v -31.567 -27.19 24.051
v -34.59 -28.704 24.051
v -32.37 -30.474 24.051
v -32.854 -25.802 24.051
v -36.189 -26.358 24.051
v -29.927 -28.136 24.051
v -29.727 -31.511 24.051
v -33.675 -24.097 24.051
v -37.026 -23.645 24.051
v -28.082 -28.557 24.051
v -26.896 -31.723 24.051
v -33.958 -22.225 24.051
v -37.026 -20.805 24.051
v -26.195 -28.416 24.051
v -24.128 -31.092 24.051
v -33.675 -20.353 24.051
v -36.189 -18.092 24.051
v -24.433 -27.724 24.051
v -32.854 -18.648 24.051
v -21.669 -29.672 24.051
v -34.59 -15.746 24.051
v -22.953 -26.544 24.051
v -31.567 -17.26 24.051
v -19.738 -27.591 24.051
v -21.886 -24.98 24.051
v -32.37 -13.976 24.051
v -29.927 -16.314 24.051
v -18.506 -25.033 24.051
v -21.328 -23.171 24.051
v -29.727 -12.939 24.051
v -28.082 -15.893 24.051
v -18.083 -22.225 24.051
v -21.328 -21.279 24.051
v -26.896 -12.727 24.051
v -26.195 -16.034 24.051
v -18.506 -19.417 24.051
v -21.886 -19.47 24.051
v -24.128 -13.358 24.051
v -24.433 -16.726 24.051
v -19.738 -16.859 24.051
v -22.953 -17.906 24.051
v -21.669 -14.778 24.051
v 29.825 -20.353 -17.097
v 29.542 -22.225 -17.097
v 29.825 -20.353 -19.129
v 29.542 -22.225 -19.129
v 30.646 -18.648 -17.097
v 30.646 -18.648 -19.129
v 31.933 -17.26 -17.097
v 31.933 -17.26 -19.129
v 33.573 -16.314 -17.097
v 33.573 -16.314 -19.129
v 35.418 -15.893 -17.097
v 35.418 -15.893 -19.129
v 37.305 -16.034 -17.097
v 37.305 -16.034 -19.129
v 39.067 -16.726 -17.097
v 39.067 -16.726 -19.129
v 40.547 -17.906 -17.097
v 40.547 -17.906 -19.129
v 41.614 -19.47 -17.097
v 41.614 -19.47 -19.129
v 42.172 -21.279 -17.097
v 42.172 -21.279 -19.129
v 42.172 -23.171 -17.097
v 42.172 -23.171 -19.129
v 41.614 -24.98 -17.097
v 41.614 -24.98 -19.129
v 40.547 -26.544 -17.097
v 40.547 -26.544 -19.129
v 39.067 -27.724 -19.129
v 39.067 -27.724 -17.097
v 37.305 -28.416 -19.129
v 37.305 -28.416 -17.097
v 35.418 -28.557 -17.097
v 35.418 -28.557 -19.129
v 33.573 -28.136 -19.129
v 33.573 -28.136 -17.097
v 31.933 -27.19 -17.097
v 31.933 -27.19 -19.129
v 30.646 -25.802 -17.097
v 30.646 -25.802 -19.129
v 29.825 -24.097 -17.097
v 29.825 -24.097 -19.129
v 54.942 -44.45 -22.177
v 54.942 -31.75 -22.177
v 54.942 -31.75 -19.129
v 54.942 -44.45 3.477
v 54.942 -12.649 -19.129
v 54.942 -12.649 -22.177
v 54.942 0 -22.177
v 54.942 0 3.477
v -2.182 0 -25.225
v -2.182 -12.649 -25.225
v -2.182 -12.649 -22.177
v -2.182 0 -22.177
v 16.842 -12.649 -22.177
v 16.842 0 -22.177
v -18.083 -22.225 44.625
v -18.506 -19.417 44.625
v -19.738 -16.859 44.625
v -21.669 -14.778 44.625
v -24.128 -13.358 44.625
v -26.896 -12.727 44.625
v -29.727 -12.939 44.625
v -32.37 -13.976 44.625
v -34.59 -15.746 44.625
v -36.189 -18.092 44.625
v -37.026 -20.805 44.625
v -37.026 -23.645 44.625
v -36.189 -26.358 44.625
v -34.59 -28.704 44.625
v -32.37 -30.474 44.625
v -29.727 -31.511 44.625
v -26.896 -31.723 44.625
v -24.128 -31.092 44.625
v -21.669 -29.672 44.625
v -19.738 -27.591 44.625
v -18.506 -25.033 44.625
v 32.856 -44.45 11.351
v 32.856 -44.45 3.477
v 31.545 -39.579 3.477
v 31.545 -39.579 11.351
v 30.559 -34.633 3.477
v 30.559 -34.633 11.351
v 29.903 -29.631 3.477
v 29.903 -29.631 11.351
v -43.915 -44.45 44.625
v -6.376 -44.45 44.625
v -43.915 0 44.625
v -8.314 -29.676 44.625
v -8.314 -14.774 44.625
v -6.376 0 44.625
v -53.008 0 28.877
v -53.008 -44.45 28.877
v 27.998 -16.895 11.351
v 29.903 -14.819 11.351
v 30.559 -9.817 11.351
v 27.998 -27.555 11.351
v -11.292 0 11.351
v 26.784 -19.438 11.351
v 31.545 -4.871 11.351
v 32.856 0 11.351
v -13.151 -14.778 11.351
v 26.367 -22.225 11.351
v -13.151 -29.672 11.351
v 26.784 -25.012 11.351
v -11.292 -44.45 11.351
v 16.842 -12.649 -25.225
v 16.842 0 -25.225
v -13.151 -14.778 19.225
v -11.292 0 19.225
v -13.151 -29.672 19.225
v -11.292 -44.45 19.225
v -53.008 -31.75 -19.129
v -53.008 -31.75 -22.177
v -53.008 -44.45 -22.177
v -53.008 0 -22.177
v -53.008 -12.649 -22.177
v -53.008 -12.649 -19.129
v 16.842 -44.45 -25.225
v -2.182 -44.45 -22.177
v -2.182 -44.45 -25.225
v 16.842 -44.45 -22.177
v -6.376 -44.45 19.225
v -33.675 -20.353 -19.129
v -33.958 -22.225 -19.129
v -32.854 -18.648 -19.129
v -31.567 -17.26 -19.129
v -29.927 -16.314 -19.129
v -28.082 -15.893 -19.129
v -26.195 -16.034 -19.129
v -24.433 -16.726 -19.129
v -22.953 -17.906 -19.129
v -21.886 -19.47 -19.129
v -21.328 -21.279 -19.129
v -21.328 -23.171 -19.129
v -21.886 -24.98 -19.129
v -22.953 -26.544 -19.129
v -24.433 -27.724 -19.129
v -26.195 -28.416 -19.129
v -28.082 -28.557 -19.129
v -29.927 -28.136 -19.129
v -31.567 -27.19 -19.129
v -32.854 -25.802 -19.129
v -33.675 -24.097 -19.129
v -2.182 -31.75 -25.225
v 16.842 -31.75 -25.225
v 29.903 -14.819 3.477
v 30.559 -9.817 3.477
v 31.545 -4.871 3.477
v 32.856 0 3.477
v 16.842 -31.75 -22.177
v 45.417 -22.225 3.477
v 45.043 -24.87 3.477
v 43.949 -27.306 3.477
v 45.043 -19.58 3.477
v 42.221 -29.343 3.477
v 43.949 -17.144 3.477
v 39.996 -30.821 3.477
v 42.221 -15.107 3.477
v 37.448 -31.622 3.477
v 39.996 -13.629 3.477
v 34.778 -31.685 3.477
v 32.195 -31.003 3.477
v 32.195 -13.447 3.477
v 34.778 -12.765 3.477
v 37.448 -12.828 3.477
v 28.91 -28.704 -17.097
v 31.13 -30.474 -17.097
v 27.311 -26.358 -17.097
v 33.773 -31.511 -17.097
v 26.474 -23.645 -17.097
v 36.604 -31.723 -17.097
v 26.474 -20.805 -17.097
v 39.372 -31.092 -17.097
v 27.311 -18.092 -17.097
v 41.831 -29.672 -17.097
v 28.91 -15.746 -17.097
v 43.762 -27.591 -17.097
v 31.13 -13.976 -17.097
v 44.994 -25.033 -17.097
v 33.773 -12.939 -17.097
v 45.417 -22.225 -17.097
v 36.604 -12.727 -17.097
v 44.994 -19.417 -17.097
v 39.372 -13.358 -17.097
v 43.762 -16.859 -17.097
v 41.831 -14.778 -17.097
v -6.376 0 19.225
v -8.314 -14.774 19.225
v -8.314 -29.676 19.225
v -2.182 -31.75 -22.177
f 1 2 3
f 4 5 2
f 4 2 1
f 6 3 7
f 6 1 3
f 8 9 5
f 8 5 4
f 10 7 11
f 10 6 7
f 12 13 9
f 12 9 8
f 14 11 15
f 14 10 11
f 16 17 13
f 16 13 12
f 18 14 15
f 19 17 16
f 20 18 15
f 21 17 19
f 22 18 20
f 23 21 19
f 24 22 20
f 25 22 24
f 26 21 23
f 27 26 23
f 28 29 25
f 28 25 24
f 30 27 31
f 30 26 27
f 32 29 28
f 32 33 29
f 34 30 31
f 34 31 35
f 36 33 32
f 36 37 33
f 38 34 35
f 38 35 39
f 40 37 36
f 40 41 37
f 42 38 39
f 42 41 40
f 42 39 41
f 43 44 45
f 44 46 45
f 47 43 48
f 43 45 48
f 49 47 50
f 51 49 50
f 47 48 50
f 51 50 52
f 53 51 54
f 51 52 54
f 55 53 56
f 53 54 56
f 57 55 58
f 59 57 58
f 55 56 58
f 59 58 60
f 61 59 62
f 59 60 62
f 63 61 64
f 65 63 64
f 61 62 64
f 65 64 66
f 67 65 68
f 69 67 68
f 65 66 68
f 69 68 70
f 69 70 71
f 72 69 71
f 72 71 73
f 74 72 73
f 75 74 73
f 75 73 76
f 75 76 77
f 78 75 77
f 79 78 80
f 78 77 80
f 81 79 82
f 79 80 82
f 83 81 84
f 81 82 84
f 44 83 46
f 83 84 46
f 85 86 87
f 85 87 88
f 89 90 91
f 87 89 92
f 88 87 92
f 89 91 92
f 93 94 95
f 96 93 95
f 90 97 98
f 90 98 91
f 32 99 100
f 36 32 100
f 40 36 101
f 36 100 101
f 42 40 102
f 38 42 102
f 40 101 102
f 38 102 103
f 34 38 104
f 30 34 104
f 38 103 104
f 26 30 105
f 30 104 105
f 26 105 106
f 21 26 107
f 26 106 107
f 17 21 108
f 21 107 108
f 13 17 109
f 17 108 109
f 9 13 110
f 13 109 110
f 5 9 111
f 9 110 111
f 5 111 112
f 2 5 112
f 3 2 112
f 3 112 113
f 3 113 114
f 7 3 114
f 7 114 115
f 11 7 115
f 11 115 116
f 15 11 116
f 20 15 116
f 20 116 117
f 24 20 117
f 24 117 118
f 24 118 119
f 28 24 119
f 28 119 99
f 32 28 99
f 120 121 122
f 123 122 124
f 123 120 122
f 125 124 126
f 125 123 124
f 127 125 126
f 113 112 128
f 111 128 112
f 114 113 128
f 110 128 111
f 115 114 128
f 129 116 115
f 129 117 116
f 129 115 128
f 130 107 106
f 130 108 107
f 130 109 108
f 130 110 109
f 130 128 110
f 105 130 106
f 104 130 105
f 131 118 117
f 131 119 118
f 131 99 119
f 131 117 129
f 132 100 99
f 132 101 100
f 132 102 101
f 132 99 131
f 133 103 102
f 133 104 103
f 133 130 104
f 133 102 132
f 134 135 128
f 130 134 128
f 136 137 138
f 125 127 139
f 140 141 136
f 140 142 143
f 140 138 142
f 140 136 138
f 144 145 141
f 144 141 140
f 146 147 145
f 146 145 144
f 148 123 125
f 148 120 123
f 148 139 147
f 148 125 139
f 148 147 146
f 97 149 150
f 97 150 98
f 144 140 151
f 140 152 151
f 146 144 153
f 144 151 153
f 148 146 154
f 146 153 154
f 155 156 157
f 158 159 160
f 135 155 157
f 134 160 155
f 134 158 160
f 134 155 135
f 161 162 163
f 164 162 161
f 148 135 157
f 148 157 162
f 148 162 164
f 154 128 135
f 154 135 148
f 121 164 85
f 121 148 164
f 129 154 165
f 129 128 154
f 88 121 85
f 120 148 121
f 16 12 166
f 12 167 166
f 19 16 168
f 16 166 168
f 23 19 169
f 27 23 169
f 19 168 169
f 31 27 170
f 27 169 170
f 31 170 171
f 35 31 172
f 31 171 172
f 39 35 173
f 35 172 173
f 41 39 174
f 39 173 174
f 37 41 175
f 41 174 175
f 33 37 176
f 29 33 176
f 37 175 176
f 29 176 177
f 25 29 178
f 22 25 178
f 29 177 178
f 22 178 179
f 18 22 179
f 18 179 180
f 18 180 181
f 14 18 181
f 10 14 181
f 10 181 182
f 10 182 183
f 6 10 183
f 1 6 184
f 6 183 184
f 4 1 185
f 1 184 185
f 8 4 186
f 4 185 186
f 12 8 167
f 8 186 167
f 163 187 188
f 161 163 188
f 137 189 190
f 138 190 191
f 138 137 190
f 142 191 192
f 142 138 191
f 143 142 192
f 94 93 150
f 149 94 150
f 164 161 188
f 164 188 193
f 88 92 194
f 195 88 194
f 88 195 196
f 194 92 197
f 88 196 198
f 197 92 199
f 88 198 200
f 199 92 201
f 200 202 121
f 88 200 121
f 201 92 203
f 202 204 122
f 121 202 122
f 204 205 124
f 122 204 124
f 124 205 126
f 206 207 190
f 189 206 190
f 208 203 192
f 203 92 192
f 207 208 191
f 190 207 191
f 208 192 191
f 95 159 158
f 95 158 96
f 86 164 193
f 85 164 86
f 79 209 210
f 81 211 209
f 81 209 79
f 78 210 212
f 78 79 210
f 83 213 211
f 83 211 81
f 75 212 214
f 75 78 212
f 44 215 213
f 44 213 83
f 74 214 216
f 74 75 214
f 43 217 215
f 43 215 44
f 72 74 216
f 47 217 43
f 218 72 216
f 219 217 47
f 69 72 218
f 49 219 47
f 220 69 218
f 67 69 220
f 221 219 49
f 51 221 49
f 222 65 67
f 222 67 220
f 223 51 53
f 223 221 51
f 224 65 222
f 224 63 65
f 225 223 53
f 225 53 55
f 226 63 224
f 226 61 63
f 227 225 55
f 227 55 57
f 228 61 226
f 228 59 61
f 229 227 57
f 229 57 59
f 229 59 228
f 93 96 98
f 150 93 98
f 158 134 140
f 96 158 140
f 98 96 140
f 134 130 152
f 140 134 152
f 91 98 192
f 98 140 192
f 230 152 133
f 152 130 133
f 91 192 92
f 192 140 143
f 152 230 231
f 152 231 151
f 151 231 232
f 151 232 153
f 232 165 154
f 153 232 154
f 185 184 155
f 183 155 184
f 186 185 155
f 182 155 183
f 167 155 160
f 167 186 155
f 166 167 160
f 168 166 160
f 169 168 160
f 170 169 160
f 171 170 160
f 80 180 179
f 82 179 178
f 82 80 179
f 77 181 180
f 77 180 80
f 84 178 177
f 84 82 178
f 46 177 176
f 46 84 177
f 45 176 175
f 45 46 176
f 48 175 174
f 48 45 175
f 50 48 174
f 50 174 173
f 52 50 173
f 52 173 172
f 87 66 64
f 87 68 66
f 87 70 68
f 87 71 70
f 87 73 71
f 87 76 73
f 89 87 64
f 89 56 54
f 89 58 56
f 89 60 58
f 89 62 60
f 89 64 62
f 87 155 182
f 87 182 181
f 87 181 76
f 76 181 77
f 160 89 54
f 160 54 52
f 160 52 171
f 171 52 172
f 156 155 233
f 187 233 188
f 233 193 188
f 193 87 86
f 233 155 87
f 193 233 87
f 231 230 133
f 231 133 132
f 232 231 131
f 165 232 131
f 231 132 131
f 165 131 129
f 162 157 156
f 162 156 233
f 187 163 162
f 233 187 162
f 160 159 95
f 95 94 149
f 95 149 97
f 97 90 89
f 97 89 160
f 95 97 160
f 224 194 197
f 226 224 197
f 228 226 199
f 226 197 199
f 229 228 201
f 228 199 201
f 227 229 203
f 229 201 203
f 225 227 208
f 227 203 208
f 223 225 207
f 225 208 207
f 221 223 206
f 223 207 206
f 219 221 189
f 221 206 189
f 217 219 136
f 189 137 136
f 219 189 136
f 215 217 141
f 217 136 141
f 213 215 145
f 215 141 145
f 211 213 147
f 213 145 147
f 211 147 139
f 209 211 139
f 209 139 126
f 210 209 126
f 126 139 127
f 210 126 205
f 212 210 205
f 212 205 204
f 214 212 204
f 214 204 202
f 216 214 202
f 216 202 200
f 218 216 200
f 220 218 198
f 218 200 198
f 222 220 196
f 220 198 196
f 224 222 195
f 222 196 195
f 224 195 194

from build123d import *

# Parameters (mm, degrees)
F0_W                   = 107.95
F0_H                   = 69.85
F1_DEPTH               = 44.45
F2_W                   = 50.8254
F2_H                   = 3.048
F2_W_2                 = 38.1
F3_DEPTH               = 66.64201
F3_DEPTH_BACK          = 161
F4_W                   = 19.1008
F4_H                   = 3.048
F4_H_2                 = 17.1056788669
F5_DEPTH               = 107.951
F7_DEPTH               = 33.274
F9_W                   = 18.9599941809
F9_H                   = 7.874
F11_W                  = 28.8704986477
F11_H                  = 14.4021337534
F12_ANGLE_BACK         = 30
F12_ANGLE              = 60
F15_D                  = 12.7
F15_CBORE_D            = 19.05
F15_CBORE_DEPTH        = 20.574
F15_ON_F14_D           = 12.7
F15_ON_F14_START       = 7.874
F15_ON_F14_CBORE_D     = 19.05
F15_ON_F14_CBORE_DEPTH = 20.574


# Not quite as in the source:
# - an extrude ends at something that could not be found from the text; its depth is read off the source's solid
# - a length typed as a fraction of an inch, garbled in the dataset ("3 / 203.2 mm" for 3/8 in), is restored


with BuildPart() as f1:
    # F0 (on Front) → F1 (new body)
    with BuildSketch(Plane.XZ):
        with Locations((0.967470929, 9.7001004595)):
            Rectangle(F0_W, F0_H)
    extrude(amount=F1_DEPTH)

    # F2 (on face) → F3 (cut, two sides)
    with BuildSketch(Plane.XZ.offset(44.45)) as f3_sk:
        with Locations((-27.594829071, -23.7008995405)):
            Rectangle(F2_W, F2_H)
        with Locations((35.892470929, -23.7008995405)):
            Rectangle(F2_W_2, F2_H)
        Polygon((-53.007529071, 44.6251004595), (-43.9154170318, 44.6251004595), (-53.007529071, 49.8744337929), (-64.4665259088, 30.026869066), (-53.007529071, 28.8771004595), align=None)
        Polygon((-53.007529071, 28.8771004595), (-43.9154170318, 44.6251004595), (-53.007529071, 44.6251004595), align=None)
    extrude(amount=-F3_DEPTH, mode=Mode.SUBTRACT)
    extrude(f3_sk.sketch, amount=F3_DEPTH_BACK, mode=Mode.SUBTRACT)

    # F4 (on face) → F5 (cut, through all)
    with BuildSketch(Plane.YZ.offset(54.942470929)):
        with Locations((-22.1996, -20.6528995405)):
            Rectangle(F4_W, F4_H)
        with Locations((-22.1996, -30.7297389739)):
            Rectangle(F4_W, F4_H_2)
    extrude(amount=-F5_DEPTH, mode=Mode.SUBTRACT)

    # F6 (on face) → F7 (cut)
    with BuildSketch(Plane.XY.offset(44.6251004595)):
        with BuildLine():
            Line((84.230268681, 4.7385622747), (-0.8366582079, 19.0712375092))
            ThreePointArc((-0.8366582079, 19.0712375092), (-8.5367916359, -24.4021880093), (0.8136185269, -67.5507755982))
            Line((0.8136185269, -67.5507755982), (81.3293292463, -56.9063611329))
            Line((81.3293292463, -56.9063611329), (105.742470929, -22.225))
            Line((105.742470929, -22.225), (84.230268681, 4.7385622747))
        make_face()
    extrude(amount=-F7_DEPTH, mode=Mode.SUBTRACT)

    # F9 (on offset) → F10 (revolve, cut)
    with BuildSketch(Plane.XZ.offset(22.225)):
        with Locations((-3.9035319805, 15.2881004595)):
            Rectangle(F9_W, F9_H)
    revolve(axis=Axis((105.742470929, -22.225, 44.6251004595), (0, 0, 1)), mode=Mode.SUBTRACT)

    # F11 (on offset) → F12 (revolve, cut)
    with BuildSketch(Plane.XZ.offset(22.225), mode=Mode.PRIVATE) as f12_sk:
        with Locations((43.9777202529, 10.6781673362)):
            Rectangle(F11_W, F11_H)
    revolve(f12_sk.sketch.rotate(Axis((105.742470929, -22.225, 44.6251004595), (0, 0, -1)), -F12_ANGLE_BACK), axis=Axis((105.742470929, -22.225, 44.6251004595), (0, 0, -1)), revolution_arc=F12_ANGLE, mode=Mode.SUBTRACT)

    # F15 (through all)
    with Locations(Plane.XY.offset(44.6251004595)):
        with Locations((-27.607529071, -22.225)):
            CounterBoreHole(F15_D / 2, F15_CBORE_D / 2, F15_CBORE_DEPTH)

    # F15 on F14 (through all)
    # its depths count from where the whole tool has entered the part; down to there all is cleared
    with Locations(Plane.XY.offset(11.3511004595).offset(-F15_ON_F14_START)):
        with Locations((35.892470929, -22.225)):
            CounterBoreHole(F15_ON_F14_D / 2, F15_ON_F14_CBORE_D / 2, F15_ON_F14_CBORE_DEPTH)


solid = f1.part
